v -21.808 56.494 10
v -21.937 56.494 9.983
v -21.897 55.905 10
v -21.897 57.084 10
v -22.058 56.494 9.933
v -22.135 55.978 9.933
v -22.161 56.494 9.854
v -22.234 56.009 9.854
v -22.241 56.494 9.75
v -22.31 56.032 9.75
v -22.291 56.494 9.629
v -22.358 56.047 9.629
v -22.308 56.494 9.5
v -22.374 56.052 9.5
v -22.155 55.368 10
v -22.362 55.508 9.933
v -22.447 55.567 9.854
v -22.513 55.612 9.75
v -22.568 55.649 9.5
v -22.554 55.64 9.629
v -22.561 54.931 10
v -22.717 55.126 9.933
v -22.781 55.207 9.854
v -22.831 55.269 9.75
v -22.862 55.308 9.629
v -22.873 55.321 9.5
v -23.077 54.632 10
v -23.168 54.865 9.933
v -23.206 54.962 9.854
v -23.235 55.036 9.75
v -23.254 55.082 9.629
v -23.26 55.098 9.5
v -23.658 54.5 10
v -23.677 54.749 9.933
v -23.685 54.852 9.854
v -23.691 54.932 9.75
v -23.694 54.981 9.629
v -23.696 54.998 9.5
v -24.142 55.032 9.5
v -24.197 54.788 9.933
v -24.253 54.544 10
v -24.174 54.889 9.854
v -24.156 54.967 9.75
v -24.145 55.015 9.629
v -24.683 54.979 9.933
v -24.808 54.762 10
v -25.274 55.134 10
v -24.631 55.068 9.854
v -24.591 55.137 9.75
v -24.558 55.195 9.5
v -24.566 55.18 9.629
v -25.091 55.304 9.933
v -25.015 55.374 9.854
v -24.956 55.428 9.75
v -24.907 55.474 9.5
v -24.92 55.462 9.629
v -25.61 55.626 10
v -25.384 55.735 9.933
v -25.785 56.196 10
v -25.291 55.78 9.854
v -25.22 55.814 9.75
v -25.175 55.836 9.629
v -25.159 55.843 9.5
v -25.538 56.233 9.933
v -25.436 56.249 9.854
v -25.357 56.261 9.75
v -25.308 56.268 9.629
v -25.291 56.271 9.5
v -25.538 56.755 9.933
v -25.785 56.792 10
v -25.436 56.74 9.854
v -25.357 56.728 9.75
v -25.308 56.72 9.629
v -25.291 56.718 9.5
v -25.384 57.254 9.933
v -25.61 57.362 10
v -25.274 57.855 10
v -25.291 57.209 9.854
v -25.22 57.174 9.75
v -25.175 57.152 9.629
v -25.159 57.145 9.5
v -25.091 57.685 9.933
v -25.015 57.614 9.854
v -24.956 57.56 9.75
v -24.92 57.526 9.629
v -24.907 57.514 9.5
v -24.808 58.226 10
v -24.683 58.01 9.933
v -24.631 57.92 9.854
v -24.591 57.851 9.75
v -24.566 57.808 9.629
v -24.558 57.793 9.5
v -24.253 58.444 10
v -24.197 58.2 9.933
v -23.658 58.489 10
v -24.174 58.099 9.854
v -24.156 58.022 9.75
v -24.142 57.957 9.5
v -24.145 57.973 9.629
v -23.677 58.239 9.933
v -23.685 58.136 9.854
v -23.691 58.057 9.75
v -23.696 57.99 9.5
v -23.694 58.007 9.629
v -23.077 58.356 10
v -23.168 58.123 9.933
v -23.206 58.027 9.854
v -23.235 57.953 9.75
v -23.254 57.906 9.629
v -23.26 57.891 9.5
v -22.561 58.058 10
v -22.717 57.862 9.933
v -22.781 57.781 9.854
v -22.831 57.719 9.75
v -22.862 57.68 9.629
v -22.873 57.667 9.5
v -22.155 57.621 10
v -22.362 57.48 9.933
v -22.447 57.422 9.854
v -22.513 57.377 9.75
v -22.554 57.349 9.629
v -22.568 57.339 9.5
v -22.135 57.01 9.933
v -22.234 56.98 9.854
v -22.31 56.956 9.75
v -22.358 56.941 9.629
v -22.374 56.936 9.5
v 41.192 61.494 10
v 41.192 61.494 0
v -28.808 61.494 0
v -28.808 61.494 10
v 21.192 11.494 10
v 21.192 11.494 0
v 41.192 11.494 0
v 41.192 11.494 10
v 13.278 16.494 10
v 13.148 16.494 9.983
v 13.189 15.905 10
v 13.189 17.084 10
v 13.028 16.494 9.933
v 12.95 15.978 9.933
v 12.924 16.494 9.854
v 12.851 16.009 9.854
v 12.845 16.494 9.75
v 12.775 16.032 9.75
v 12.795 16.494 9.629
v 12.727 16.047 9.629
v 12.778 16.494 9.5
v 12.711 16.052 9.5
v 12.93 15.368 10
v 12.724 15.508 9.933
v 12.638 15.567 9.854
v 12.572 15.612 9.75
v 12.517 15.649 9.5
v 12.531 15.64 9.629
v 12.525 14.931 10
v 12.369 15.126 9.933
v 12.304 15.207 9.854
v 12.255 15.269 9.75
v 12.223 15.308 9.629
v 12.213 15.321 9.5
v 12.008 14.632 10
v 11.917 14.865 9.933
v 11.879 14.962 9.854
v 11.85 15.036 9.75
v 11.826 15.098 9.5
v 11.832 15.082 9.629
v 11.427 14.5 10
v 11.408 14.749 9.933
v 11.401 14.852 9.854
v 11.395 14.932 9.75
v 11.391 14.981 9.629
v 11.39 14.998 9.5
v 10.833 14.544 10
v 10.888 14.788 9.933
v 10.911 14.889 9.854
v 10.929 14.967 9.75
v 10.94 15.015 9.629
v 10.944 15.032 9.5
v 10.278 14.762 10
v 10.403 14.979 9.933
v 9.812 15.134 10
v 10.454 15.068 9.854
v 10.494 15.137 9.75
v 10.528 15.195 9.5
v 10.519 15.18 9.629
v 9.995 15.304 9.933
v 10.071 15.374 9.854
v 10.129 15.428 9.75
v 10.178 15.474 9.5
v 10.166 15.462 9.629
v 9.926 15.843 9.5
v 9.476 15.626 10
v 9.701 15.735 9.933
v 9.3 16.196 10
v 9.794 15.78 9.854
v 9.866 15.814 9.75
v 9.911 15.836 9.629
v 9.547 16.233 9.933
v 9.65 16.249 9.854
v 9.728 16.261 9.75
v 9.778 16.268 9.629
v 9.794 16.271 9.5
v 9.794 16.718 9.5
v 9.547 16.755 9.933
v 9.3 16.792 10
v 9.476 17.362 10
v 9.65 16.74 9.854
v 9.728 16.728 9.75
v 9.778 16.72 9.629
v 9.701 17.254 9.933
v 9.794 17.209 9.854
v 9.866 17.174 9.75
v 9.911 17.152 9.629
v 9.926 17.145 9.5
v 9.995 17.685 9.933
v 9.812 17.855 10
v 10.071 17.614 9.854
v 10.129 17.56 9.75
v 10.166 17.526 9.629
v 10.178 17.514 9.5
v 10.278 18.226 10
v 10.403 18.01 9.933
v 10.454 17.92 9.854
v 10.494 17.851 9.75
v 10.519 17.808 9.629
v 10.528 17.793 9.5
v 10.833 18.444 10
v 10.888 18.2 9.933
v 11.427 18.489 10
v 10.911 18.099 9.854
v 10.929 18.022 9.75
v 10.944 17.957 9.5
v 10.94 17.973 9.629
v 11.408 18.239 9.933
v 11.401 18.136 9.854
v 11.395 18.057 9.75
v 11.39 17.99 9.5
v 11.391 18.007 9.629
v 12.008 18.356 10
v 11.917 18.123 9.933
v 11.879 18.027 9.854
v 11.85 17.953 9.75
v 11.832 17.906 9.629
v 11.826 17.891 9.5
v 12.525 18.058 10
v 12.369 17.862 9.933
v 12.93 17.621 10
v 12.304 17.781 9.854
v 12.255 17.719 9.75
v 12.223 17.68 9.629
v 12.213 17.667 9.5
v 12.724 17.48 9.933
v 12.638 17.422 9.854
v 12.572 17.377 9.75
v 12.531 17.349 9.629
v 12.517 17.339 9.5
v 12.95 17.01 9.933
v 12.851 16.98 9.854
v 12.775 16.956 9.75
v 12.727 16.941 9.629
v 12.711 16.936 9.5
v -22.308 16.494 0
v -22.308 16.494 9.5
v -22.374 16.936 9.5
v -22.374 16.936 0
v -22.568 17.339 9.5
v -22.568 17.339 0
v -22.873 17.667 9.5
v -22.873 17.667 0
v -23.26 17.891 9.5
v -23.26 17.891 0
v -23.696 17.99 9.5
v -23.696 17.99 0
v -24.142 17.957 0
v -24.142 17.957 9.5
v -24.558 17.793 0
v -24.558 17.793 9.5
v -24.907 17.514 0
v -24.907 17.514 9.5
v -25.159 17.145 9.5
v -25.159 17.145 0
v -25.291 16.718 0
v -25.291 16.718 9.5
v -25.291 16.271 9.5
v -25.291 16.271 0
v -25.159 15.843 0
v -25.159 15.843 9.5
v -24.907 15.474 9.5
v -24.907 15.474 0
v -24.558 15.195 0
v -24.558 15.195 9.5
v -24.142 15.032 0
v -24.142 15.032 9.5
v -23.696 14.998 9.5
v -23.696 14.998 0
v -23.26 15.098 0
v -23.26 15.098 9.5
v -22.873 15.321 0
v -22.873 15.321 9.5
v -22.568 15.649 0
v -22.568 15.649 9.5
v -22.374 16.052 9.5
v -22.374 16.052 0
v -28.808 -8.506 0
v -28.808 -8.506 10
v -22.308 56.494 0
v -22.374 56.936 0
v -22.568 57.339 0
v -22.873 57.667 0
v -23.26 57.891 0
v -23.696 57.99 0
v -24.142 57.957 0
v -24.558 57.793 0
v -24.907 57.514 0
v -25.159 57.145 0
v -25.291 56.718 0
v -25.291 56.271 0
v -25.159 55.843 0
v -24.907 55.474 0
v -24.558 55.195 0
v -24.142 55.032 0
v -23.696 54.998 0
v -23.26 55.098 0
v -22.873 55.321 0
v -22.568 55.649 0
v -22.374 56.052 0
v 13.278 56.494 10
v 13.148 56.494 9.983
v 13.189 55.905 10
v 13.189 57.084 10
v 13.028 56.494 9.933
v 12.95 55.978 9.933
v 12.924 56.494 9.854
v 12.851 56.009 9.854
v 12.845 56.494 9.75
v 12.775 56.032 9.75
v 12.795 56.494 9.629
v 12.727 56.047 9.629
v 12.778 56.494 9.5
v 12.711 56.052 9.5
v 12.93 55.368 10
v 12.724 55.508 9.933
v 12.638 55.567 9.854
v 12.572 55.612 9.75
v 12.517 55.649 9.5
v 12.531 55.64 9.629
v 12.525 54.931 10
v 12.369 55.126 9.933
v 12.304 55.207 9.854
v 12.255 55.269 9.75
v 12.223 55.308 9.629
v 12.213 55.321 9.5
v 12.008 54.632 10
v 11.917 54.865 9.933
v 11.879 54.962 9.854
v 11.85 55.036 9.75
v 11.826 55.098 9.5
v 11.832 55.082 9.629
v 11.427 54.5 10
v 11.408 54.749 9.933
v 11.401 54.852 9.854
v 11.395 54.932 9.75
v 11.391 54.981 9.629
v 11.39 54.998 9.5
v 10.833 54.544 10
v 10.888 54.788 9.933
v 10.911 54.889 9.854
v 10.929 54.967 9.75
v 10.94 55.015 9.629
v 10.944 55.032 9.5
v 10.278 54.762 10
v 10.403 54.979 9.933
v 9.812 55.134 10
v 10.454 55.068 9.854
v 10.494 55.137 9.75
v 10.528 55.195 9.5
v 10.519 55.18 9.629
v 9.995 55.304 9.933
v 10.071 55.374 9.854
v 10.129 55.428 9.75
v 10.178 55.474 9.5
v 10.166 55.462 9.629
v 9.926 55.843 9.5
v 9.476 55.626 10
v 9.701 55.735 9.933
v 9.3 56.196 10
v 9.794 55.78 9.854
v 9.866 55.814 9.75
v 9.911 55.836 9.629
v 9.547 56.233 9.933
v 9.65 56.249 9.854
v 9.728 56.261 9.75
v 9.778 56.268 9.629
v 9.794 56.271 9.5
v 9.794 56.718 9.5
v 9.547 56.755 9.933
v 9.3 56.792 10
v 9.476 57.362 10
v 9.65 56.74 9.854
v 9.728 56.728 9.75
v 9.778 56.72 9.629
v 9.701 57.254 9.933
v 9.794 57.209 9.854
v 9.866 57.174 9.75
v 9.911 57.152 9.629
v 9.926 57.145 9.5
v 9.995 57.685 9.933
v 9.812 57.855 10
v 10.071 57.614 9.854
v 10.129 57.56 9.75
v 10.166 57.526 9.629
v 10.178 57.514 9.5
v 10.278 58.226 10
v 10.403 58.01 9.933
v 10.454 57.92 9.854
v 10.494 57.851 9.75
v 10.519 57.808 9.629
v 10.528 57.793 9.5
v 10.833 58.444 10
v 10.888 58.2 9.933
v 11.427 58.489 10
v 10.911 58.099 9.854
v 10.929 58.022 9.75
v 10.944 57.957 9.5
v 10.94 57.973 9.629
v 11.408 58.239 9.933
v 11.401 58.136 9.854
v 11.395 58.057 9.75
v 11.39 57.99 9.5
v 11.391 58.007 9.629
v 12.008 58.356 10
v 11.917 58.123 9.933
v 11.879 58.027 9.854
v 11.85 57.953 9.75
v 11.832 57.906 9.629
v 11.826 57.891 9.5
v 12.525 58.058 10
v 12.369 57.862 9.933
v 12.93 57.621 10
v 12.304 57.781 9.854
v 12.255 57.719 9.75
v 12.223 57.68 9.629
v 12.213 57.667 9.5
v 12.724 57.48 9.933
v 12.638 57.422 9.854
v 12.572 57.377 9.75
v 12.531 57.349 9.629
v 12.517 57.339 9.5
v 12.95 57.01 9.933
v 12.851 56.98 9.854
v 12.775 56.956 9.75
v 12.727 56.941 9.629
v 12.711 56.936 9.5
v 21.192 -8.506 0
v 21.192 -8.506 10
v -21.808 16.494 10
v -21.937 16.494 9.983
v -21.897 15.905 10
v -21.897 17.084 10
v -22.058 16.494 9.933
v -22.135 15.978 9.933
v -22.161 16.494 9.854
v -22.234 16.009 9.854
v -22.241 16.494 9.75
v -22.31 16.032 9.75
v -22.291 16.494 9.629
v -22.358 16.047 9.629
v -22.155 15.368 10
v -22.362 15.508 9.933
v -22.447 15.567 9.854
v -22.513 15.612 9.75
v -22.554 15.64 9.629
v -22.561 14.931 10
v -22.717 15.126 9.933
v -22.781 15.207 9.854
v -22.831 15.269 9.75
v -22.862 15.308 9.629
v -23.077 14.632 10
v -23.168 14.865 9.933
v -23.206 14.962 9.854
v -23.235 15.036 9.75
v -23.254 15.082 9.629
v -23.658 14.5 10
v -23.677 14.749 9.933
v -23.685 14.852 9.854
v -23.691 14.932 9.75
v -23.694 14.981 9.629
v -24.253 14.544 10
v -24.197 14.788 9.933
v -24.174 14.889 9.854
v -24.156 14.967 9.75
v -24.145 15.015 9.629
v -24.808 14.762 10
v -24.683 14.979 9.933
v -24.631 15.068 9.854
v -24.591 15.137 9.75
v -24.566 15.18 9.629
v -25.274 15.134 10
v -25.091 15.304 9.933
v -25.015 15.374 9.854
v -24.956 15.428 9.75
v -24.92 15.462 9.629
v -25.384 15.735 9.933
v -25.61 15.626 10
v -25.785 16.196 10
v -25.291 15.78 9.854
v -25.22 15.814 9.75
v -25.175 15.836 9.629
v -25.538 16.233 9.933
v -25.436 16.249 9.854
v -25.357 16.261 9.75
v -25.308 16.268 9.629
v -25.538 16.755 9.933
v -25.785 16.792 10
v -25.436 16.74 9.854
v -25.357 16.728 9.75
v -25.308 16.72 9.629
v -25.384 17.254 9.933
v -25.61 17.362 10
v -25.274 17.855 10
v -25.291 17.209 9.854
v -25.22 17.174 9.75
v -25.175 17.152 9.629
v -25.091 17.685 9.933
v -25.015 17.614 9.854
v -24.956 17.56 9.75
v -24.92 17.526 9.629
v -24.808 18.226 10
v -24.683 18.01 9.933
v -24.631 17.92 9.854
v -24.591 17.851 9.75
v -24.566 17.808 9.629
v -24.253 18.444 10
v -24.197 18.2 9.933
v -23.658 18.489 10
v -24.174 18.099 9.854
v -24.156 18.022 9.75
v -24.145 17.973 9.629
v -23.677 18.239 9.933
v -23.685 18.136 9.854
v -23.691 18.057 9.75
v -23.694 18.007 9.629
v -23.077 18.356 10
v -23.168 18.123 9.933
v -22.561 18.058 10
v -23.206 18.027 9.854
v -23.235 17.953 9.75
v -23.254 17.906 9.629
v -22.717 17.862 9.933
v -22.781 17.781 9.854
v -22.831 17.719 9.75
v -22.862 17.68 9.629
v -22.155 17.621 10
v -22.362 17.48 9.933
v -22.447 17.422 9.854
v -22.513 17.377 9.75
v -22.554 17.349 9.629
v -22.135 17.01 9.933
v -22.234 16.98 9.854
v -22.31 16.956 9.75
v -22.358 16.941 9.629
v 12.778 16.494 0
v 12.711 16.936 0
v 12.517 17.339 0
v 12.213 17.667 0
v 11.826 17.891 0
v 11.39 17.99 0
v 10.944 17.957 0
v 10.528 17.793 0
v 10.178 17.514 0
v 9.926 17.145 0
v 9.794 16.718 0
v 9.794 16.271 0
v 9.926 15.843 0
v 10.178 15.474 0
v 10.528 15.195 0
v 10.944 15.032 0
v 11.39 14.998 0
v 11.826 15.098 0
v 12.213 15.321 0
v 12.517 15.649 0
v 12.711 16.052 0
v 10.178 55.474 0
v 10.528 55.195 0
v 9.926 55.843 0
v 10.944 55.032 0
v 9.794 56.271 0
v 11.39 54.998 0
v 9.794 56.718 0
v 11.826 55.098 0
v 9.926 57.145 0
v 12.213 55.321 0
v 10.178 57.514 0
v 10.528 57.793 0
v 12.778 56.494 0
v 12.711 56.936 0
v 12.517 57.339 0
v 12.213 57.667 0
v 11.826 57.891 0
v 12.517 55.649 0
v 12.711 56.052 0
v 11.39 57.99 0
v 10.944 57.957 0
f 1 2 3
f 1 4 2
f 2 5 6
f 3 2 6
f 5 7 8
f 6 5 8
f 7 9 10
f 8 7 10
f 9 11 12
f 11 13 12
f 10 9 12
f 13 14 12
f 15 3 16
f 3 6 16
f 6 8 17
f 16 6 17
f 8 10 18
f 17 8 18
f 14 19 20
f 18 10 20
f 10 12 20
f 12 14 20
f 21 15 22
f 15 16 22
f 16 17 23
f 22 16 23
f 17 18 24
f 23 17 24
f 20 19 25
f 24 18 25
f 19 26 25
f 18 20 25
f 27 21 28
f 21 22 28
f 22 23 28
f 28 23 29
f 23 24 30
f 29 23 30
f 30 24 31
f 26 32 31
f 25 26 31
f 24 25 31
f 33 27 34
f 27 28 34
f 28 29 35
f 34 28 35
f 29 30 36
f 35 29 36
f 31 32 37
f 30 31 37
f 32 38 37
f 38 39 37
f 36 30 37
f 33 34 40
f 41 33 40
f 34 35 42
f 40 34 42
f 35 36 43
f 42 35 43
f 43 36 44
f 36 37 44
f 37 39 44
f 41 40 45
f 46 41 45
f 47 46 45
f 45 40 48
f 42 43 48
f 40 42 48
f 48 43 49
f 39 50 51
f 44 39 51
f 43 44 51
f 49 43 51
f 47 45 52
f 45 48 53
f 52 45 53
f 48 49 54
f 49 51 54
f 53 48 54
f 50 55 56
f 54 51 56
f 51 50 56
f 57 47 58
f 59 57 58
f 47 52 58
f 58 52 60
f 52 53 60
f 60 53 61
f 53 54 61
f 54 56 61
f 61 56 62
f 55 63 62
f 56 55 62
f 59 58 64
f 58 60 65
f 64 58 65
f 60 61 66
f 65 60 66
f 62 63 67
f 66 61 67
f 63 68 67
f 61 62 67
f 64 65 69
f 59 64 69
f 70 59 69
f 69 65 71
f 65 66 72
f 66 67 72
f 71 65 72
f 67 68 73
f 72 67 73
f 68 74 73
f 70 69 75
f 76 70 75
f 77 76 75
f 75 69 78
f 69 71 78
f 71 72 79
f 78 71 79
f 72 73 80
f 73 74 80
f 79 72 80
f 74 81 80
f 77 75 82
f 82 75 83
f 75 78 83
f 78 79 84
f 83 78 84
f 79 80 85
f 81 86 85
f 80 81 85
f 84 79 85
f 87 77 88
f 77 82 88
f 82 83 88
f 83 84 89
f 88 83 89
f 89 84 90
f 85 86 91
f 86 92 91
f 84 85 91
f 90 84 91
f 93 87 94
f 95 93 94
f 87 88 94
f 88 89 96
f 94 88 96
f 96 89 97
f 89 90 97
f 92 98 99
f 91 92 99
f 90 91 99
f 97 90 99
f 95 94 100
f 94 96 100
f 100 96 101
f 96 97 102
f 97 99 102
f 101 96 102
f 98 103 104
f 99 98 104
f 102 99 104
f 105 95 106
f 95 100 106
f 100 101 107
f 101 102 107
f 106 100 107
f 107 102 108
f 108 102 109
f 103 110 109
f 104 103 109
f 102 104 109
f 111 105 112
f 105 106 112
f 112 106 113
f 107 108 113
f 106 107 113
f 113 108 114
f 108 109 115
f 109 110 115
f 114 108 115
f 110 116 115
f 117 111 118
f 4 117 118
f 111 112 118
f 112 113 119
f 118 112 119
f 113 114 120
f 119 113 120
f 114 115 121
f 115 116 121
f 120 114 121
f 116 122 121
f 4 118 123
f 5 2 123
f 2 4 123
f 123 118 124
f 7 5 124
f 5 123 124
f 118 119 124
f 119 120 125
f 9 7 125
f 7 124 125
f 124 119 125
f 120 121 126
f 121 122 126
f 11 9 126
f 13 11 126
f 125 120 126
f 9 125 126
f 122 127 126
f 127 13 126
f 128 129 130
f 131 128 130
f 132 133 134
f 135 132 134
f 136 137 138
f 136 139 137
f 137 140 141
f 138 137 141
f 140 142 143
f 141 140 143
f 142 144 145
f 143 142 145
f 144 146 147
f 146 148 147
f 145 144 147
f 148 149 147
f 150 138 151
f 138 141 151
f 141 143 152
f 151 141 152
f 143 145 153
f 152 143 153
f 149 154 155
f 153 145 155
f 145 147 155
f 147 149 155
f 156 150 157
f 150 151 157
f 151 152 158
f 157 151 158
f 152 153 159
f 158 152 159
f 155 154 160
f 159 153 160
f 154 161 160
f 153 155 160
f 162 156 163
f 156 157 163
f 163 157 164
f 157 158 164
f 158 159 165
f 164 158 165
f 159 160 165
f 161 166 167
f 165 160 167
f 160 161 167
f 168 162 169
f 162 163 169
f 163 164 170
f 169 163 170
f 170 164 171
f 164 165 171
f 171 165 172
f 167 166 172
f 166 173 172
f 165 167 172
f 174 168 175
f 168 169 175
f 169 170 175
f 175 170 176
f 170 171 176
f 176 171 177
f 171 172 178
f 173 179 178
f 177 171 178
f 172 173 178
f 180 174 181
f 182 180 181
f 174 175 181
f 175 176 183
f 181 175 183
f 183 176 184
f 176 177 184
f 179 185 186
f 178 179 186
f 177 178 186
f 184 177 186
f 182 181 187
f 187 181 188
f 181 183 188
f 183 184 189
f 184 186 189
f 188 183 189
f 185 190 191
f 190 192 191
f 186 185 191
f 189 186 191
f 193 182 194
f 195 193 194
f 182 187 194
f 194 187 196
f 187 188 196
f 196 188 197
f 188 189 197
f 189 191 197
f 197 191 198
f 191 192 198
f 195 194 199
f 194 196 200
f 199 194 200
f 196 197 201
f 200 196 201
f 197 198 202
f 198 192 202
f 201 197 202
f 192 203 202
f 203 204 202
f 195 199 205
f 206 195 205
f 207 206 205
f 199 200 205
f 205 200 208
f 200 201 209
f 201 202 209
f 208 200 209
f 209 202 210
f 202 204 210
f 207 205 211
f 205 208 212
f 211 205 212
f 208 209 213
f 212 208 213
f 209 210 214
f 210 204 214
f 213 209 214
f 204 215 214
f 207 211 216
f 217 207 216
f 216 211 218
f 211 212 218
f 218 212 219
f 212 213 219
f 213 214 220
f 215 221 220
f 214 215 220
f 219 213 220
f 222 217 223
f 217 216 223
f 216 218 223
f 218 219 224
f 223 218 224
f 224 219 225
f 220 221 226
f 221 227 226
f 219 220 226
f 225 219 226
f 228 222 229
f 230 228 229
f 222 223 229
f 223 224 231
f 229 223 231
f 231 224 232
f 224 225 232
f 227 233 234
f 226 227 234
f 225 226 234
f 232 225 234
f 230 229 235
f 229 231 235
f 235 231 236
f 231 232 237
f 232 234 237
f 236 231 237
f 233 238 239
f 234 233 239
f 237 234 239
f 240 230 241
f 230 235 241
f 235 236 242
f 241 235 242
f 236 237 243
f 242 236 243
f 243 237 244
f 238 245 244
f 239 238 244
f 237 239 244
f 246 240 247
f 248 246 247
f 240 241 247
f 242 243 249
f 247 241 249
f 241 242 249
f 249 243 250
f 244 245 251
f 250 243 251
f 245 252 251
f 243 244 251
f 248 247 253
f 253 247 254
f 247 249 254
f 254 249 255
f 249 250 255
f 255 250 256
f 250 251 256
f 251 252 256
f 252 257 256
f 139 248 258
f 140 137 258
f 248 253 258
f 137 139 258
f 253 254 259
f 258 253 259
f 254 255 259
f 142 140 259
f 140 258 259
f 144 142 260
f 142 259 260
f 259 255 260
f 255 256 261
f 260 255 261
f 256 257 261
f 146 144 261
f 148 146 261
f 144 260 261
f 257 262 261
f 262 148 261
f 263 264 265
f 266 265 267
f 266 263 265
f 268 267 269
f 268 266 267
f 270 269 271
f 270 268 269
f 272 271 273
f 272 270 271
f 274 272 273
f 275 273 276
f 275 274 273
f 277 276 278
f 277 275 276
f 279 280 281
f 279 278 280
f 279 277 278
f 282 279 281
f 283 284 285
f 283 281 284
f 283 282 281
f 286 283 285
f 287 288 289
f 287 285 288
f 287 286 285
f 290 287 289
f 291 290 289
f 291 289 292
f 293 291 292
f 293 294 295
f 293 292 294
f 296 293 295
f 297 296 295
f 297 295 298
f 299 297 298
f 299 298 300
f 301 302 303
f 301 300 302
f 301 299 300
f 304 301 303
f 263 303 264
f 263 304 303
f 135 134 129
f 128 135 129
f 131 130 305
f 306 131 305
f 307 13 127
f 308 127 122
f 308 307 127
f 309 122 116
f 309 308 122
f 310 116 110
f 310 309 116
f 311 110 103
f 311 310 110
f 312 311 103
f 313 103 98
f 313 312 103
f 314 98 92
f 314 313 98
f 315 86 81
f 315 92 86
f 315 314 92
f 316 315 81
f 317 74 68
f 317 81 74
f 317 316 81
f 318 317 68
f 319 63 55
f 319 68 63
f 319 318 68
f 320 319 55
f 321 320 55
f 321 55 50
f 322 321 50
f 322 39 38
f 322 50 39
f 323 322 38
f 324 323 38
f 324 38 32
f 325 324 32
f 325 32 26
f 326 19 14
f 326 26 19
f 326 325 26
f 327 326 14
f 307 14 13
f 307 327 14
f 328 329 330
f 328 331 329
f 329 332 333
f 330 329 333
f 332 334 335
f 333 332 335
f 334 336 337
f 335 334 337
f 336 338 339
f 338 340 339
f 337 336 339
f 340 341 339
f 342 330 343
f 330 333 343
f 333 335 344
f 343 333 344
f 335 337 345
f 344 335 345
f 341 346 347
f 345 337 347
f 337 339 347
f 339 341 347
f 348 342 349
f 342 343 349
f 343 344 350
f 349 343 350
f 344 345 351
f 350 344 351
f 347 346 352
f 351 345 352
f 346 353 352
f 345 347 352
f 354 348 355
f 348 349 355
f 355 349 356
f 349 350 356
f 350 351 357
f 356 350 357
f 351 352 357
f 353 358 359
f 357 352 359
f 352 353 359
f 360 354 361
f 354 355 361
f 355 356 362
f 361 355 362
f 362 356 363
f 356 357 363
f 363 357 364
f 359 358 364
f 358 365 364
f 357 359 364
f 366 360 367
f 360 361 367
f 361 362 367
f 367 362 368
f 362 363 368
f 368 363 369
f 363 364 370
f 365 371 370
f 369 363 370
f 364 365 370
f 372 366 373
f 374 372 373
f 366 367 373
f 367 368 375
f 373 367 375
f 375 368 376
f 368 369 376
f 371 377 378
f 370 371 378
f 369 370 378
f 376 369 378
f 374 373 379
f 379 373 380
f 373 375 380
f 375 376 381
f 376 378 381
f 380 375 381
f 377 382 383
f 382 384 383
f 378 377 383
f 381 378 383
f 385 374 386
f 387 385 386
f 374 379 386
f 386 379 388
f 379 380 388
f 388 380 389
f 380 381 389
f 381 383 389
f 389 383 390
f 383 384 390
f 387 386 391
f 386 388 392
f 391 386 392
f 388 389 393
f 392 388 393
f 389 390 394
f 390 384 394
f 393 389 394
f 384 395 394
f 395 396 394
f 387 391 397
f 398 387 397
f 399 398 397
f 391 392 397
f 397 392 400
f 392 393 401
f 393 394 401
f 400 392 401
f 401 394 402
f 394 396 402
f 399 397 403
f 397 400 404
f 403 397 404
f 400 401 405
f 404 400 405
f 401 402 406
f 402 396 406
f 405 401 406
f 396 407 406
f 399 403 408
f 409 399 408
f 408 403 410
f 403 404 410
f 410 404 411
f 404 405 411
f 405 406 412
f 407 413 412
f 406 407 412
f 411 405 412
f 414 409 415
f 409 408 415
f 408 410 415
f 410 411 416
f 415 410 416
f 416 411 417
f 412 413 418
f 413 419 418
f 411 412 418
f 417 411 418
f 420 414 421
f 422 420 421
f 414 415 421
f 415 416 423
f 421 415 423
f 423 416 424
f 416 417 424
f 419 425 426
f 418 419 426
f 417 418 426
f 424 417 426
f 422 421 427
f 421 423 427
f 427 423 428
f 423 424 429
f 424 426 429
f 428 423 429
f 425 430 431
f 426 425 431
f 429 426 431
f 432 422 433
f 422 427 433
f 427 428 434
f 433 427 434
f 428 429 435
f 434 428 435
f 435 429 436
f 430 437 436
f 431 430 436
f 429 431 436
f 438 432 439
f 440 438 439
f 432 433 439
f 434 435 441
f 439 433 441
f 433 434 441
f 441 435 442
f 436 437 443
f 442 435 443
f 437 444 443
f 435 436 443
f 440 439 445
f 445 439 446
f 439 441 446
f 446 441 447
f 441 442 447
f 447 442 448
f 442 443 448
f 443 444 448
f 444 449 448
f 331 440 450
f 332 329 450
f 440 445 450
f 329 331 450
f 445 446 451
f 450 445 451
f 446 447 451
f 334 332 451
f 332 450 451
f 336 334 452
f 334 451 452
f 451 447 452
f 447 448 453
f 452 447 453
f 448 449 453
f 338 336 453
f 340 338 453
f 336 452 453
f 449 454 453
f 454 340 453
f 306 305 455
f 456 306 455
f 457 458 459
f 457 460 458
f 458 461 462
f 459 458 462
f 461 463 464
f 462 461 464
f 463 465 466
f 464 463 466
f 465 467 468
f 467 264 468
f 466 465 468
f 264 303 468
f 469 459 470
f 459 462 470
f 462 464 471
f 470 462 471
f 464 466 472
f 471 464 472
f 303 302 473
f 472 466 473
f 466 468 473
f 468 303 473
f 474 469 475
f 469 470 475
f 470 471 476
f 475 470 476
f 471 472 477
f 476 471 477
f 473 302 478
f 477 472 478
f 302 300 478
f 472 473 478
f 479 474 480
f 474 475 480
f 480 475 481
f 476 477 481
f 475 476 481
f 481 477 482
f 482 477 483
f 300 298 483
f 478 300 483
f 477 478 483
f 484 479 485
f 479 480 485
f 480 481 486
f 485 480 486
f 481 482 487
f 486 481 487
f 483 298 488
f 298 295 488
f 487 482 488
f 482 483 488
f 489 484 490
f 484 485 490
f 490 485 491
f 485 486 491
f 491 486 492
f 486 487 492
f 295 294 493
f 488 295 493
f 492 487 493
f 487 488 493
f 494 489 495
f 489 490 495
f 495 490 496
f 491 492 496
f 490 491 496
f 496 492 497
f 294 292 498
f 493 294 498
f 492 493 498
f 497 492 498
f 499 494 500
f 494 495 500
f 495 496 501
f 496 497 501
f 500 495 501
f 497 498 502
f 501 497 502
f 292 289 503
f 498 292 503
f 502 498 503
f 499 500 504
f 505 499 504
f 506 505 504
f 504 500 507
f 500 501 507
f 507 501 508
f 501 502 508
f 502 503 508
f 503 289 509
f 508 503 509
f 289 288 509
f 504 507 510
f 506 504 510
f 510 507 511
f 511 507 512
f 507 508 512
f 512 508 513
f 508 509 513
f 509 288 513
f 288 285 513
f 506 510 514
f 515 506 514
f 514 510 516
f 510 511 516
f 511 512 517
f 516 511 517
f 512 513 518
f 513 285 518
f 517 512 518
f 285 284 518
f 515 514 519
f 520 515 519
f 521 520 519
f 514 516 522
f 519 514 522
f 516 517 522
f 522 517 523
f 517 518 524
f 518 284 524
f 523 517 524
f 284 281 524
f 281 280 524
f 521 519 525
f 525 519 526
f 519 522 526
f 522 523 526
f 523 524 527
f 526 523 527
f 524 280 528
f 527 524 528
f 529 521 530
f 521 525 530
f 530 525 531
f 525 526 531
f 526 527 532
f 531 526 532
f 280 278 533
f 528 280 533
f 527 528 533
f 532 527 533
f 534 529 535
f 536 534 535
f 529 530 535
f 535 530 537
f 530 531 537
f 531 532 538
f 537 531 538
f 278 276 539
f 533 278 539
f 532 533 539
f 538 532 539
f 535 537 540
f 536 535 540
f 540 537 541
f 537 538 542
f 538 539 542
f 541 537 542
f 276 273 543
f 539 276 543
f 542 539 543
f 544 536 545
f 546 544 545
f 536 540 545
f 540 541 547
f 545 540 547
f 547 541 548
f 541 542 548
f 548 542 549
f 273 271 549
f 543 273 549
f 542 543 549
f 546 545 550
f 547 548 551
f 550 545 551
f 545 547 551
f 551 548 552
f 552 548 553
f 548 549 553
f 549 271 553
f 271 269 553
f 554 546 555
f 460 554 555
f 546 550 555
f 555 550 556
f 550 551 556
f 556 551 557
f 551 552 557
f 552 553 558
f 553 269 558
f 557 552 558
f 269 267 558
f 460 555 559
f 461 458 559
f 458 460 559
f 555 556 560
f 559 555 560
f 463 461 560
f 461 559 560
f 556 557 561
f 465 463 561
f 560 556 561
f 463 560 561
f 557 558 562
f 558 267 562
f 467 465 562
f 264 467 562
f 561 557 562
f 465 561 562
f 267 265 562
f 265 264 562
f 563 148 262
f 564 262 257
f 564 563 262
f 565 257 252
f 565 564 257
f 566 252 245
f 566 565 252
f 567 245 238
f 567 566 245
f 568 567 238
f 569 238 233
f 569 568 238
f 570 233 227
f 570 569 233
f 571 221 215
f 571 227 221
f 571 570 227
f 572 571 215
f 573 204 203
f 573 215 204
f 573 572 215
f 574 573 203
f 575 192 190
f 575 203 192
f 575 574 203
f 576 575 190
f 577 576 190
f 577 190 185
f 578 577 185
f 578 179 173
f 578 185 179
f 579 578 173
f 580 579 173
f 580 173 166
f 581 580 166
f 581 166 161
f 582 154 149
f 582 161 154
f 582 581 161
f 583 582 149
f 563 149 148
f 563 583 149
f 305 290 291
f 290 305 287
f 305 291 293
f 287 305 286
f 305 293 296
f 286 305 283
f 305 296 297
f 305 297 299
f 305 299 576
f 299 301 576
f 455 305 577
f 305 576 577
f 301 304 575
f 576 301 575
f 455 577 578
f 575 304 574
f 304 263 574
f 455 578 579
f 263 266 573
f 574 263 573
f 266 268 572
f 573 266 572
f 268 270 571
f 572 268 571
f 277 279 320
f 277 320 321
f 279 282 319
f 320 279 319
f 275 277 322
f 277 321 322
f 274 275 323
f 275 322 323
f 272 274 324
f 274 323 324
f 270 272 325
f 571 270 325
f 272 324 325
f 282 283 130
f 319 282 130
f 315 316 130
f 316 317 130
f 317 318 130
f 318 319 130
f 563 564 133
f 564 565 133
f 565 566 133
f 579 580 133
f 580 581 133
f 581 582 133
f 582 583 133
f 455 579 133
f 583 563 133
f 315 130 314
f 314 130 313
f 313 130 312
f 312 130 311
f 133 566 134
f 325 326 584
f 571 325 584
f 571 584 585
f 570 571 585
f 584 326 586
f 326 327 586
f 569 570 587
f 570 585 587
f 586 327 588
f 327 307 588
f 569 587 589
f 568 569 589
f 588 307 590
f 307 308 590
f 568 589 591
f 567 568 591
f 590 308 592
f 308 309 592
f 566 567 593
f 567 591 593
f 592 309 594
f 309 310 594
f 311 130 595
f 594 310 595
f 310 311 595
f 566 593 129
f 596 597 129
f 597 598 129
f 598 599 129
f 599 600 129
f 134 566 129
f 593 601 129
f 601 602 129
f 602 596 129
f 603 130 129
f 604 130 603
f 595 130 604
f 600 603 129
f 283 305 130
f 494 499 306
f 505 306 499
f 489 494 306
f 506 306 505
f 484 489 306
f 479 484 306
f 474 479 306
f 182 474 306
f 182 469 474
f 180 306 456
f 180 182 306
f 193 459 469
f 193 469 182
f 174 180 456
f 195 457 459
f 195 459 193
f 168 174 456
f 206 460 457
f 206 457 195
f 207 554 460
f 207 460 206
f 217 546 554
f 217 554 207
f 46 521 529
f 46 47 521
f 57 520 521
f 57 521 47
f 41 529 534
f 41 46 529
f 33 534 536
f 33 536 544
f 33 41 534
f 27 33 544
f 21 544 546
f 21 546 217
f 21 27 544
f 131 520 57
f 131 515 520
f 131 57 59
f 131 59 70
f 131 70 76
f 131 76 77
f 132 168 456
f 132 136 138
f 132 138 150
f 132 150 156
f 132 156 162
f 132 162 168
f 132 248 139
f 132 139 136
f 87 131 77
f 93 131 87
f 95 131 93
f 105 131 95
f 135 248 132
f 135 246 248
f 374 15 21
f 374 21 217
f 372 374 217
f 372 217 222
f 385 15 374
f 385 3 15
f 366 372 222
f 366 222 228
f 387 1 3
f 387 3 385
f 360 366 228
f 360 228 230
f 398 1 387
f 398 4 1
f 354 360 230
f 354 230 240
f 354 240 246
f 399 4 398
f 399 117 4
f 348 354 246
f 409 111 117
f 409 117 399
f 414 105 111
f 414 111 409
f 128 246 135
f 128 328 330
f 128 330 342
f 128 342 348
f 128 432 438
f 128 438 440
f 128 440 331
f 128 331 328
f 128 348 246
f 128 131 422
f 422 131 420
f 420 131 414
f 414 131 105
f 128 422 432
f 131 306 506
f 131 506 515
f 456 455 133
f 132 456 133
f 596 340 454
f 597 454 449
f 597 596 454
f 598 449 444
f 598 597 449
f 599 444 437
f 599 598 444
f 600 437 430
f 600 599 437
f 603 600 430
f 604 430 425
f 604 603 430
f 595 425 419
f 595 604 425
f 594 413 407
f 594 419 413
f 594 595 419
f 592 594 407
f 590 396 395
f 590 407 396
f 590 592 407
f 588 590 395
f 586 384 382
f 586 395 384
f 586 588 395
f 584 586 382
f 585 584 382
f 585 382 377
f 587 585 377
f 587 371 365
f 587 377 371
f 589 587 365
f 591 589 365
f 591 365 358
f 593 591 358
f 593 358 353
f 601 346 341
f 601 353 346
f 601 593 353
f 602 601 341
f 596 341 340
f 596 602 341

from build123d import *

# Parameters (mm, degrees)
F1_DEPTH = 10
F2_R     = 1.5
F3_DEPTH = 10.001
F4_R     = 0.5


with BuildPart() as f1:
    # F0 (on Top) → F1 (new body)
    with BuildSketch(Plane.XY):
        Polygon((41.192254, 61.494219), (-28.807746, 61.494219), (-28.807746, -8.505781), (21.192254, -8.505781), (21.192254, 11.494219), (41.192254, 11.494219), align=None)
    extrude(amount=F1_DEPTH)

    # F2 (on Top) → F3 (cut, through all)
    with BuildSketch(Plane.XY):
        with Locations((-23.807746, 56.494219)):
            Circle(F2_R)
        with Locations((11.277618, 56.494219)):
            Circle(F2_R)
        with Locations((11.277618, 16.494219)):
            Circle(F2_R)
        with Locations((-23.807746, 16.494219)):
            Circle(F2_R)
    extrude(amount=F3_DEPTH, mode=Mode.SUBTRACT)

    # F4
    f4_edges = [f1.edges().sort_by_distance(p)[0] for p in [
        (-25.307746, 16.494219, 10),
        (-25.307746, 56.494219, 10),
        (9.777618, 56.494219, 10),
        (9.777618, 16.494219, 10),
    ]]
    fillet(f4_edges, radius=F4_R)


solid = f1.part
